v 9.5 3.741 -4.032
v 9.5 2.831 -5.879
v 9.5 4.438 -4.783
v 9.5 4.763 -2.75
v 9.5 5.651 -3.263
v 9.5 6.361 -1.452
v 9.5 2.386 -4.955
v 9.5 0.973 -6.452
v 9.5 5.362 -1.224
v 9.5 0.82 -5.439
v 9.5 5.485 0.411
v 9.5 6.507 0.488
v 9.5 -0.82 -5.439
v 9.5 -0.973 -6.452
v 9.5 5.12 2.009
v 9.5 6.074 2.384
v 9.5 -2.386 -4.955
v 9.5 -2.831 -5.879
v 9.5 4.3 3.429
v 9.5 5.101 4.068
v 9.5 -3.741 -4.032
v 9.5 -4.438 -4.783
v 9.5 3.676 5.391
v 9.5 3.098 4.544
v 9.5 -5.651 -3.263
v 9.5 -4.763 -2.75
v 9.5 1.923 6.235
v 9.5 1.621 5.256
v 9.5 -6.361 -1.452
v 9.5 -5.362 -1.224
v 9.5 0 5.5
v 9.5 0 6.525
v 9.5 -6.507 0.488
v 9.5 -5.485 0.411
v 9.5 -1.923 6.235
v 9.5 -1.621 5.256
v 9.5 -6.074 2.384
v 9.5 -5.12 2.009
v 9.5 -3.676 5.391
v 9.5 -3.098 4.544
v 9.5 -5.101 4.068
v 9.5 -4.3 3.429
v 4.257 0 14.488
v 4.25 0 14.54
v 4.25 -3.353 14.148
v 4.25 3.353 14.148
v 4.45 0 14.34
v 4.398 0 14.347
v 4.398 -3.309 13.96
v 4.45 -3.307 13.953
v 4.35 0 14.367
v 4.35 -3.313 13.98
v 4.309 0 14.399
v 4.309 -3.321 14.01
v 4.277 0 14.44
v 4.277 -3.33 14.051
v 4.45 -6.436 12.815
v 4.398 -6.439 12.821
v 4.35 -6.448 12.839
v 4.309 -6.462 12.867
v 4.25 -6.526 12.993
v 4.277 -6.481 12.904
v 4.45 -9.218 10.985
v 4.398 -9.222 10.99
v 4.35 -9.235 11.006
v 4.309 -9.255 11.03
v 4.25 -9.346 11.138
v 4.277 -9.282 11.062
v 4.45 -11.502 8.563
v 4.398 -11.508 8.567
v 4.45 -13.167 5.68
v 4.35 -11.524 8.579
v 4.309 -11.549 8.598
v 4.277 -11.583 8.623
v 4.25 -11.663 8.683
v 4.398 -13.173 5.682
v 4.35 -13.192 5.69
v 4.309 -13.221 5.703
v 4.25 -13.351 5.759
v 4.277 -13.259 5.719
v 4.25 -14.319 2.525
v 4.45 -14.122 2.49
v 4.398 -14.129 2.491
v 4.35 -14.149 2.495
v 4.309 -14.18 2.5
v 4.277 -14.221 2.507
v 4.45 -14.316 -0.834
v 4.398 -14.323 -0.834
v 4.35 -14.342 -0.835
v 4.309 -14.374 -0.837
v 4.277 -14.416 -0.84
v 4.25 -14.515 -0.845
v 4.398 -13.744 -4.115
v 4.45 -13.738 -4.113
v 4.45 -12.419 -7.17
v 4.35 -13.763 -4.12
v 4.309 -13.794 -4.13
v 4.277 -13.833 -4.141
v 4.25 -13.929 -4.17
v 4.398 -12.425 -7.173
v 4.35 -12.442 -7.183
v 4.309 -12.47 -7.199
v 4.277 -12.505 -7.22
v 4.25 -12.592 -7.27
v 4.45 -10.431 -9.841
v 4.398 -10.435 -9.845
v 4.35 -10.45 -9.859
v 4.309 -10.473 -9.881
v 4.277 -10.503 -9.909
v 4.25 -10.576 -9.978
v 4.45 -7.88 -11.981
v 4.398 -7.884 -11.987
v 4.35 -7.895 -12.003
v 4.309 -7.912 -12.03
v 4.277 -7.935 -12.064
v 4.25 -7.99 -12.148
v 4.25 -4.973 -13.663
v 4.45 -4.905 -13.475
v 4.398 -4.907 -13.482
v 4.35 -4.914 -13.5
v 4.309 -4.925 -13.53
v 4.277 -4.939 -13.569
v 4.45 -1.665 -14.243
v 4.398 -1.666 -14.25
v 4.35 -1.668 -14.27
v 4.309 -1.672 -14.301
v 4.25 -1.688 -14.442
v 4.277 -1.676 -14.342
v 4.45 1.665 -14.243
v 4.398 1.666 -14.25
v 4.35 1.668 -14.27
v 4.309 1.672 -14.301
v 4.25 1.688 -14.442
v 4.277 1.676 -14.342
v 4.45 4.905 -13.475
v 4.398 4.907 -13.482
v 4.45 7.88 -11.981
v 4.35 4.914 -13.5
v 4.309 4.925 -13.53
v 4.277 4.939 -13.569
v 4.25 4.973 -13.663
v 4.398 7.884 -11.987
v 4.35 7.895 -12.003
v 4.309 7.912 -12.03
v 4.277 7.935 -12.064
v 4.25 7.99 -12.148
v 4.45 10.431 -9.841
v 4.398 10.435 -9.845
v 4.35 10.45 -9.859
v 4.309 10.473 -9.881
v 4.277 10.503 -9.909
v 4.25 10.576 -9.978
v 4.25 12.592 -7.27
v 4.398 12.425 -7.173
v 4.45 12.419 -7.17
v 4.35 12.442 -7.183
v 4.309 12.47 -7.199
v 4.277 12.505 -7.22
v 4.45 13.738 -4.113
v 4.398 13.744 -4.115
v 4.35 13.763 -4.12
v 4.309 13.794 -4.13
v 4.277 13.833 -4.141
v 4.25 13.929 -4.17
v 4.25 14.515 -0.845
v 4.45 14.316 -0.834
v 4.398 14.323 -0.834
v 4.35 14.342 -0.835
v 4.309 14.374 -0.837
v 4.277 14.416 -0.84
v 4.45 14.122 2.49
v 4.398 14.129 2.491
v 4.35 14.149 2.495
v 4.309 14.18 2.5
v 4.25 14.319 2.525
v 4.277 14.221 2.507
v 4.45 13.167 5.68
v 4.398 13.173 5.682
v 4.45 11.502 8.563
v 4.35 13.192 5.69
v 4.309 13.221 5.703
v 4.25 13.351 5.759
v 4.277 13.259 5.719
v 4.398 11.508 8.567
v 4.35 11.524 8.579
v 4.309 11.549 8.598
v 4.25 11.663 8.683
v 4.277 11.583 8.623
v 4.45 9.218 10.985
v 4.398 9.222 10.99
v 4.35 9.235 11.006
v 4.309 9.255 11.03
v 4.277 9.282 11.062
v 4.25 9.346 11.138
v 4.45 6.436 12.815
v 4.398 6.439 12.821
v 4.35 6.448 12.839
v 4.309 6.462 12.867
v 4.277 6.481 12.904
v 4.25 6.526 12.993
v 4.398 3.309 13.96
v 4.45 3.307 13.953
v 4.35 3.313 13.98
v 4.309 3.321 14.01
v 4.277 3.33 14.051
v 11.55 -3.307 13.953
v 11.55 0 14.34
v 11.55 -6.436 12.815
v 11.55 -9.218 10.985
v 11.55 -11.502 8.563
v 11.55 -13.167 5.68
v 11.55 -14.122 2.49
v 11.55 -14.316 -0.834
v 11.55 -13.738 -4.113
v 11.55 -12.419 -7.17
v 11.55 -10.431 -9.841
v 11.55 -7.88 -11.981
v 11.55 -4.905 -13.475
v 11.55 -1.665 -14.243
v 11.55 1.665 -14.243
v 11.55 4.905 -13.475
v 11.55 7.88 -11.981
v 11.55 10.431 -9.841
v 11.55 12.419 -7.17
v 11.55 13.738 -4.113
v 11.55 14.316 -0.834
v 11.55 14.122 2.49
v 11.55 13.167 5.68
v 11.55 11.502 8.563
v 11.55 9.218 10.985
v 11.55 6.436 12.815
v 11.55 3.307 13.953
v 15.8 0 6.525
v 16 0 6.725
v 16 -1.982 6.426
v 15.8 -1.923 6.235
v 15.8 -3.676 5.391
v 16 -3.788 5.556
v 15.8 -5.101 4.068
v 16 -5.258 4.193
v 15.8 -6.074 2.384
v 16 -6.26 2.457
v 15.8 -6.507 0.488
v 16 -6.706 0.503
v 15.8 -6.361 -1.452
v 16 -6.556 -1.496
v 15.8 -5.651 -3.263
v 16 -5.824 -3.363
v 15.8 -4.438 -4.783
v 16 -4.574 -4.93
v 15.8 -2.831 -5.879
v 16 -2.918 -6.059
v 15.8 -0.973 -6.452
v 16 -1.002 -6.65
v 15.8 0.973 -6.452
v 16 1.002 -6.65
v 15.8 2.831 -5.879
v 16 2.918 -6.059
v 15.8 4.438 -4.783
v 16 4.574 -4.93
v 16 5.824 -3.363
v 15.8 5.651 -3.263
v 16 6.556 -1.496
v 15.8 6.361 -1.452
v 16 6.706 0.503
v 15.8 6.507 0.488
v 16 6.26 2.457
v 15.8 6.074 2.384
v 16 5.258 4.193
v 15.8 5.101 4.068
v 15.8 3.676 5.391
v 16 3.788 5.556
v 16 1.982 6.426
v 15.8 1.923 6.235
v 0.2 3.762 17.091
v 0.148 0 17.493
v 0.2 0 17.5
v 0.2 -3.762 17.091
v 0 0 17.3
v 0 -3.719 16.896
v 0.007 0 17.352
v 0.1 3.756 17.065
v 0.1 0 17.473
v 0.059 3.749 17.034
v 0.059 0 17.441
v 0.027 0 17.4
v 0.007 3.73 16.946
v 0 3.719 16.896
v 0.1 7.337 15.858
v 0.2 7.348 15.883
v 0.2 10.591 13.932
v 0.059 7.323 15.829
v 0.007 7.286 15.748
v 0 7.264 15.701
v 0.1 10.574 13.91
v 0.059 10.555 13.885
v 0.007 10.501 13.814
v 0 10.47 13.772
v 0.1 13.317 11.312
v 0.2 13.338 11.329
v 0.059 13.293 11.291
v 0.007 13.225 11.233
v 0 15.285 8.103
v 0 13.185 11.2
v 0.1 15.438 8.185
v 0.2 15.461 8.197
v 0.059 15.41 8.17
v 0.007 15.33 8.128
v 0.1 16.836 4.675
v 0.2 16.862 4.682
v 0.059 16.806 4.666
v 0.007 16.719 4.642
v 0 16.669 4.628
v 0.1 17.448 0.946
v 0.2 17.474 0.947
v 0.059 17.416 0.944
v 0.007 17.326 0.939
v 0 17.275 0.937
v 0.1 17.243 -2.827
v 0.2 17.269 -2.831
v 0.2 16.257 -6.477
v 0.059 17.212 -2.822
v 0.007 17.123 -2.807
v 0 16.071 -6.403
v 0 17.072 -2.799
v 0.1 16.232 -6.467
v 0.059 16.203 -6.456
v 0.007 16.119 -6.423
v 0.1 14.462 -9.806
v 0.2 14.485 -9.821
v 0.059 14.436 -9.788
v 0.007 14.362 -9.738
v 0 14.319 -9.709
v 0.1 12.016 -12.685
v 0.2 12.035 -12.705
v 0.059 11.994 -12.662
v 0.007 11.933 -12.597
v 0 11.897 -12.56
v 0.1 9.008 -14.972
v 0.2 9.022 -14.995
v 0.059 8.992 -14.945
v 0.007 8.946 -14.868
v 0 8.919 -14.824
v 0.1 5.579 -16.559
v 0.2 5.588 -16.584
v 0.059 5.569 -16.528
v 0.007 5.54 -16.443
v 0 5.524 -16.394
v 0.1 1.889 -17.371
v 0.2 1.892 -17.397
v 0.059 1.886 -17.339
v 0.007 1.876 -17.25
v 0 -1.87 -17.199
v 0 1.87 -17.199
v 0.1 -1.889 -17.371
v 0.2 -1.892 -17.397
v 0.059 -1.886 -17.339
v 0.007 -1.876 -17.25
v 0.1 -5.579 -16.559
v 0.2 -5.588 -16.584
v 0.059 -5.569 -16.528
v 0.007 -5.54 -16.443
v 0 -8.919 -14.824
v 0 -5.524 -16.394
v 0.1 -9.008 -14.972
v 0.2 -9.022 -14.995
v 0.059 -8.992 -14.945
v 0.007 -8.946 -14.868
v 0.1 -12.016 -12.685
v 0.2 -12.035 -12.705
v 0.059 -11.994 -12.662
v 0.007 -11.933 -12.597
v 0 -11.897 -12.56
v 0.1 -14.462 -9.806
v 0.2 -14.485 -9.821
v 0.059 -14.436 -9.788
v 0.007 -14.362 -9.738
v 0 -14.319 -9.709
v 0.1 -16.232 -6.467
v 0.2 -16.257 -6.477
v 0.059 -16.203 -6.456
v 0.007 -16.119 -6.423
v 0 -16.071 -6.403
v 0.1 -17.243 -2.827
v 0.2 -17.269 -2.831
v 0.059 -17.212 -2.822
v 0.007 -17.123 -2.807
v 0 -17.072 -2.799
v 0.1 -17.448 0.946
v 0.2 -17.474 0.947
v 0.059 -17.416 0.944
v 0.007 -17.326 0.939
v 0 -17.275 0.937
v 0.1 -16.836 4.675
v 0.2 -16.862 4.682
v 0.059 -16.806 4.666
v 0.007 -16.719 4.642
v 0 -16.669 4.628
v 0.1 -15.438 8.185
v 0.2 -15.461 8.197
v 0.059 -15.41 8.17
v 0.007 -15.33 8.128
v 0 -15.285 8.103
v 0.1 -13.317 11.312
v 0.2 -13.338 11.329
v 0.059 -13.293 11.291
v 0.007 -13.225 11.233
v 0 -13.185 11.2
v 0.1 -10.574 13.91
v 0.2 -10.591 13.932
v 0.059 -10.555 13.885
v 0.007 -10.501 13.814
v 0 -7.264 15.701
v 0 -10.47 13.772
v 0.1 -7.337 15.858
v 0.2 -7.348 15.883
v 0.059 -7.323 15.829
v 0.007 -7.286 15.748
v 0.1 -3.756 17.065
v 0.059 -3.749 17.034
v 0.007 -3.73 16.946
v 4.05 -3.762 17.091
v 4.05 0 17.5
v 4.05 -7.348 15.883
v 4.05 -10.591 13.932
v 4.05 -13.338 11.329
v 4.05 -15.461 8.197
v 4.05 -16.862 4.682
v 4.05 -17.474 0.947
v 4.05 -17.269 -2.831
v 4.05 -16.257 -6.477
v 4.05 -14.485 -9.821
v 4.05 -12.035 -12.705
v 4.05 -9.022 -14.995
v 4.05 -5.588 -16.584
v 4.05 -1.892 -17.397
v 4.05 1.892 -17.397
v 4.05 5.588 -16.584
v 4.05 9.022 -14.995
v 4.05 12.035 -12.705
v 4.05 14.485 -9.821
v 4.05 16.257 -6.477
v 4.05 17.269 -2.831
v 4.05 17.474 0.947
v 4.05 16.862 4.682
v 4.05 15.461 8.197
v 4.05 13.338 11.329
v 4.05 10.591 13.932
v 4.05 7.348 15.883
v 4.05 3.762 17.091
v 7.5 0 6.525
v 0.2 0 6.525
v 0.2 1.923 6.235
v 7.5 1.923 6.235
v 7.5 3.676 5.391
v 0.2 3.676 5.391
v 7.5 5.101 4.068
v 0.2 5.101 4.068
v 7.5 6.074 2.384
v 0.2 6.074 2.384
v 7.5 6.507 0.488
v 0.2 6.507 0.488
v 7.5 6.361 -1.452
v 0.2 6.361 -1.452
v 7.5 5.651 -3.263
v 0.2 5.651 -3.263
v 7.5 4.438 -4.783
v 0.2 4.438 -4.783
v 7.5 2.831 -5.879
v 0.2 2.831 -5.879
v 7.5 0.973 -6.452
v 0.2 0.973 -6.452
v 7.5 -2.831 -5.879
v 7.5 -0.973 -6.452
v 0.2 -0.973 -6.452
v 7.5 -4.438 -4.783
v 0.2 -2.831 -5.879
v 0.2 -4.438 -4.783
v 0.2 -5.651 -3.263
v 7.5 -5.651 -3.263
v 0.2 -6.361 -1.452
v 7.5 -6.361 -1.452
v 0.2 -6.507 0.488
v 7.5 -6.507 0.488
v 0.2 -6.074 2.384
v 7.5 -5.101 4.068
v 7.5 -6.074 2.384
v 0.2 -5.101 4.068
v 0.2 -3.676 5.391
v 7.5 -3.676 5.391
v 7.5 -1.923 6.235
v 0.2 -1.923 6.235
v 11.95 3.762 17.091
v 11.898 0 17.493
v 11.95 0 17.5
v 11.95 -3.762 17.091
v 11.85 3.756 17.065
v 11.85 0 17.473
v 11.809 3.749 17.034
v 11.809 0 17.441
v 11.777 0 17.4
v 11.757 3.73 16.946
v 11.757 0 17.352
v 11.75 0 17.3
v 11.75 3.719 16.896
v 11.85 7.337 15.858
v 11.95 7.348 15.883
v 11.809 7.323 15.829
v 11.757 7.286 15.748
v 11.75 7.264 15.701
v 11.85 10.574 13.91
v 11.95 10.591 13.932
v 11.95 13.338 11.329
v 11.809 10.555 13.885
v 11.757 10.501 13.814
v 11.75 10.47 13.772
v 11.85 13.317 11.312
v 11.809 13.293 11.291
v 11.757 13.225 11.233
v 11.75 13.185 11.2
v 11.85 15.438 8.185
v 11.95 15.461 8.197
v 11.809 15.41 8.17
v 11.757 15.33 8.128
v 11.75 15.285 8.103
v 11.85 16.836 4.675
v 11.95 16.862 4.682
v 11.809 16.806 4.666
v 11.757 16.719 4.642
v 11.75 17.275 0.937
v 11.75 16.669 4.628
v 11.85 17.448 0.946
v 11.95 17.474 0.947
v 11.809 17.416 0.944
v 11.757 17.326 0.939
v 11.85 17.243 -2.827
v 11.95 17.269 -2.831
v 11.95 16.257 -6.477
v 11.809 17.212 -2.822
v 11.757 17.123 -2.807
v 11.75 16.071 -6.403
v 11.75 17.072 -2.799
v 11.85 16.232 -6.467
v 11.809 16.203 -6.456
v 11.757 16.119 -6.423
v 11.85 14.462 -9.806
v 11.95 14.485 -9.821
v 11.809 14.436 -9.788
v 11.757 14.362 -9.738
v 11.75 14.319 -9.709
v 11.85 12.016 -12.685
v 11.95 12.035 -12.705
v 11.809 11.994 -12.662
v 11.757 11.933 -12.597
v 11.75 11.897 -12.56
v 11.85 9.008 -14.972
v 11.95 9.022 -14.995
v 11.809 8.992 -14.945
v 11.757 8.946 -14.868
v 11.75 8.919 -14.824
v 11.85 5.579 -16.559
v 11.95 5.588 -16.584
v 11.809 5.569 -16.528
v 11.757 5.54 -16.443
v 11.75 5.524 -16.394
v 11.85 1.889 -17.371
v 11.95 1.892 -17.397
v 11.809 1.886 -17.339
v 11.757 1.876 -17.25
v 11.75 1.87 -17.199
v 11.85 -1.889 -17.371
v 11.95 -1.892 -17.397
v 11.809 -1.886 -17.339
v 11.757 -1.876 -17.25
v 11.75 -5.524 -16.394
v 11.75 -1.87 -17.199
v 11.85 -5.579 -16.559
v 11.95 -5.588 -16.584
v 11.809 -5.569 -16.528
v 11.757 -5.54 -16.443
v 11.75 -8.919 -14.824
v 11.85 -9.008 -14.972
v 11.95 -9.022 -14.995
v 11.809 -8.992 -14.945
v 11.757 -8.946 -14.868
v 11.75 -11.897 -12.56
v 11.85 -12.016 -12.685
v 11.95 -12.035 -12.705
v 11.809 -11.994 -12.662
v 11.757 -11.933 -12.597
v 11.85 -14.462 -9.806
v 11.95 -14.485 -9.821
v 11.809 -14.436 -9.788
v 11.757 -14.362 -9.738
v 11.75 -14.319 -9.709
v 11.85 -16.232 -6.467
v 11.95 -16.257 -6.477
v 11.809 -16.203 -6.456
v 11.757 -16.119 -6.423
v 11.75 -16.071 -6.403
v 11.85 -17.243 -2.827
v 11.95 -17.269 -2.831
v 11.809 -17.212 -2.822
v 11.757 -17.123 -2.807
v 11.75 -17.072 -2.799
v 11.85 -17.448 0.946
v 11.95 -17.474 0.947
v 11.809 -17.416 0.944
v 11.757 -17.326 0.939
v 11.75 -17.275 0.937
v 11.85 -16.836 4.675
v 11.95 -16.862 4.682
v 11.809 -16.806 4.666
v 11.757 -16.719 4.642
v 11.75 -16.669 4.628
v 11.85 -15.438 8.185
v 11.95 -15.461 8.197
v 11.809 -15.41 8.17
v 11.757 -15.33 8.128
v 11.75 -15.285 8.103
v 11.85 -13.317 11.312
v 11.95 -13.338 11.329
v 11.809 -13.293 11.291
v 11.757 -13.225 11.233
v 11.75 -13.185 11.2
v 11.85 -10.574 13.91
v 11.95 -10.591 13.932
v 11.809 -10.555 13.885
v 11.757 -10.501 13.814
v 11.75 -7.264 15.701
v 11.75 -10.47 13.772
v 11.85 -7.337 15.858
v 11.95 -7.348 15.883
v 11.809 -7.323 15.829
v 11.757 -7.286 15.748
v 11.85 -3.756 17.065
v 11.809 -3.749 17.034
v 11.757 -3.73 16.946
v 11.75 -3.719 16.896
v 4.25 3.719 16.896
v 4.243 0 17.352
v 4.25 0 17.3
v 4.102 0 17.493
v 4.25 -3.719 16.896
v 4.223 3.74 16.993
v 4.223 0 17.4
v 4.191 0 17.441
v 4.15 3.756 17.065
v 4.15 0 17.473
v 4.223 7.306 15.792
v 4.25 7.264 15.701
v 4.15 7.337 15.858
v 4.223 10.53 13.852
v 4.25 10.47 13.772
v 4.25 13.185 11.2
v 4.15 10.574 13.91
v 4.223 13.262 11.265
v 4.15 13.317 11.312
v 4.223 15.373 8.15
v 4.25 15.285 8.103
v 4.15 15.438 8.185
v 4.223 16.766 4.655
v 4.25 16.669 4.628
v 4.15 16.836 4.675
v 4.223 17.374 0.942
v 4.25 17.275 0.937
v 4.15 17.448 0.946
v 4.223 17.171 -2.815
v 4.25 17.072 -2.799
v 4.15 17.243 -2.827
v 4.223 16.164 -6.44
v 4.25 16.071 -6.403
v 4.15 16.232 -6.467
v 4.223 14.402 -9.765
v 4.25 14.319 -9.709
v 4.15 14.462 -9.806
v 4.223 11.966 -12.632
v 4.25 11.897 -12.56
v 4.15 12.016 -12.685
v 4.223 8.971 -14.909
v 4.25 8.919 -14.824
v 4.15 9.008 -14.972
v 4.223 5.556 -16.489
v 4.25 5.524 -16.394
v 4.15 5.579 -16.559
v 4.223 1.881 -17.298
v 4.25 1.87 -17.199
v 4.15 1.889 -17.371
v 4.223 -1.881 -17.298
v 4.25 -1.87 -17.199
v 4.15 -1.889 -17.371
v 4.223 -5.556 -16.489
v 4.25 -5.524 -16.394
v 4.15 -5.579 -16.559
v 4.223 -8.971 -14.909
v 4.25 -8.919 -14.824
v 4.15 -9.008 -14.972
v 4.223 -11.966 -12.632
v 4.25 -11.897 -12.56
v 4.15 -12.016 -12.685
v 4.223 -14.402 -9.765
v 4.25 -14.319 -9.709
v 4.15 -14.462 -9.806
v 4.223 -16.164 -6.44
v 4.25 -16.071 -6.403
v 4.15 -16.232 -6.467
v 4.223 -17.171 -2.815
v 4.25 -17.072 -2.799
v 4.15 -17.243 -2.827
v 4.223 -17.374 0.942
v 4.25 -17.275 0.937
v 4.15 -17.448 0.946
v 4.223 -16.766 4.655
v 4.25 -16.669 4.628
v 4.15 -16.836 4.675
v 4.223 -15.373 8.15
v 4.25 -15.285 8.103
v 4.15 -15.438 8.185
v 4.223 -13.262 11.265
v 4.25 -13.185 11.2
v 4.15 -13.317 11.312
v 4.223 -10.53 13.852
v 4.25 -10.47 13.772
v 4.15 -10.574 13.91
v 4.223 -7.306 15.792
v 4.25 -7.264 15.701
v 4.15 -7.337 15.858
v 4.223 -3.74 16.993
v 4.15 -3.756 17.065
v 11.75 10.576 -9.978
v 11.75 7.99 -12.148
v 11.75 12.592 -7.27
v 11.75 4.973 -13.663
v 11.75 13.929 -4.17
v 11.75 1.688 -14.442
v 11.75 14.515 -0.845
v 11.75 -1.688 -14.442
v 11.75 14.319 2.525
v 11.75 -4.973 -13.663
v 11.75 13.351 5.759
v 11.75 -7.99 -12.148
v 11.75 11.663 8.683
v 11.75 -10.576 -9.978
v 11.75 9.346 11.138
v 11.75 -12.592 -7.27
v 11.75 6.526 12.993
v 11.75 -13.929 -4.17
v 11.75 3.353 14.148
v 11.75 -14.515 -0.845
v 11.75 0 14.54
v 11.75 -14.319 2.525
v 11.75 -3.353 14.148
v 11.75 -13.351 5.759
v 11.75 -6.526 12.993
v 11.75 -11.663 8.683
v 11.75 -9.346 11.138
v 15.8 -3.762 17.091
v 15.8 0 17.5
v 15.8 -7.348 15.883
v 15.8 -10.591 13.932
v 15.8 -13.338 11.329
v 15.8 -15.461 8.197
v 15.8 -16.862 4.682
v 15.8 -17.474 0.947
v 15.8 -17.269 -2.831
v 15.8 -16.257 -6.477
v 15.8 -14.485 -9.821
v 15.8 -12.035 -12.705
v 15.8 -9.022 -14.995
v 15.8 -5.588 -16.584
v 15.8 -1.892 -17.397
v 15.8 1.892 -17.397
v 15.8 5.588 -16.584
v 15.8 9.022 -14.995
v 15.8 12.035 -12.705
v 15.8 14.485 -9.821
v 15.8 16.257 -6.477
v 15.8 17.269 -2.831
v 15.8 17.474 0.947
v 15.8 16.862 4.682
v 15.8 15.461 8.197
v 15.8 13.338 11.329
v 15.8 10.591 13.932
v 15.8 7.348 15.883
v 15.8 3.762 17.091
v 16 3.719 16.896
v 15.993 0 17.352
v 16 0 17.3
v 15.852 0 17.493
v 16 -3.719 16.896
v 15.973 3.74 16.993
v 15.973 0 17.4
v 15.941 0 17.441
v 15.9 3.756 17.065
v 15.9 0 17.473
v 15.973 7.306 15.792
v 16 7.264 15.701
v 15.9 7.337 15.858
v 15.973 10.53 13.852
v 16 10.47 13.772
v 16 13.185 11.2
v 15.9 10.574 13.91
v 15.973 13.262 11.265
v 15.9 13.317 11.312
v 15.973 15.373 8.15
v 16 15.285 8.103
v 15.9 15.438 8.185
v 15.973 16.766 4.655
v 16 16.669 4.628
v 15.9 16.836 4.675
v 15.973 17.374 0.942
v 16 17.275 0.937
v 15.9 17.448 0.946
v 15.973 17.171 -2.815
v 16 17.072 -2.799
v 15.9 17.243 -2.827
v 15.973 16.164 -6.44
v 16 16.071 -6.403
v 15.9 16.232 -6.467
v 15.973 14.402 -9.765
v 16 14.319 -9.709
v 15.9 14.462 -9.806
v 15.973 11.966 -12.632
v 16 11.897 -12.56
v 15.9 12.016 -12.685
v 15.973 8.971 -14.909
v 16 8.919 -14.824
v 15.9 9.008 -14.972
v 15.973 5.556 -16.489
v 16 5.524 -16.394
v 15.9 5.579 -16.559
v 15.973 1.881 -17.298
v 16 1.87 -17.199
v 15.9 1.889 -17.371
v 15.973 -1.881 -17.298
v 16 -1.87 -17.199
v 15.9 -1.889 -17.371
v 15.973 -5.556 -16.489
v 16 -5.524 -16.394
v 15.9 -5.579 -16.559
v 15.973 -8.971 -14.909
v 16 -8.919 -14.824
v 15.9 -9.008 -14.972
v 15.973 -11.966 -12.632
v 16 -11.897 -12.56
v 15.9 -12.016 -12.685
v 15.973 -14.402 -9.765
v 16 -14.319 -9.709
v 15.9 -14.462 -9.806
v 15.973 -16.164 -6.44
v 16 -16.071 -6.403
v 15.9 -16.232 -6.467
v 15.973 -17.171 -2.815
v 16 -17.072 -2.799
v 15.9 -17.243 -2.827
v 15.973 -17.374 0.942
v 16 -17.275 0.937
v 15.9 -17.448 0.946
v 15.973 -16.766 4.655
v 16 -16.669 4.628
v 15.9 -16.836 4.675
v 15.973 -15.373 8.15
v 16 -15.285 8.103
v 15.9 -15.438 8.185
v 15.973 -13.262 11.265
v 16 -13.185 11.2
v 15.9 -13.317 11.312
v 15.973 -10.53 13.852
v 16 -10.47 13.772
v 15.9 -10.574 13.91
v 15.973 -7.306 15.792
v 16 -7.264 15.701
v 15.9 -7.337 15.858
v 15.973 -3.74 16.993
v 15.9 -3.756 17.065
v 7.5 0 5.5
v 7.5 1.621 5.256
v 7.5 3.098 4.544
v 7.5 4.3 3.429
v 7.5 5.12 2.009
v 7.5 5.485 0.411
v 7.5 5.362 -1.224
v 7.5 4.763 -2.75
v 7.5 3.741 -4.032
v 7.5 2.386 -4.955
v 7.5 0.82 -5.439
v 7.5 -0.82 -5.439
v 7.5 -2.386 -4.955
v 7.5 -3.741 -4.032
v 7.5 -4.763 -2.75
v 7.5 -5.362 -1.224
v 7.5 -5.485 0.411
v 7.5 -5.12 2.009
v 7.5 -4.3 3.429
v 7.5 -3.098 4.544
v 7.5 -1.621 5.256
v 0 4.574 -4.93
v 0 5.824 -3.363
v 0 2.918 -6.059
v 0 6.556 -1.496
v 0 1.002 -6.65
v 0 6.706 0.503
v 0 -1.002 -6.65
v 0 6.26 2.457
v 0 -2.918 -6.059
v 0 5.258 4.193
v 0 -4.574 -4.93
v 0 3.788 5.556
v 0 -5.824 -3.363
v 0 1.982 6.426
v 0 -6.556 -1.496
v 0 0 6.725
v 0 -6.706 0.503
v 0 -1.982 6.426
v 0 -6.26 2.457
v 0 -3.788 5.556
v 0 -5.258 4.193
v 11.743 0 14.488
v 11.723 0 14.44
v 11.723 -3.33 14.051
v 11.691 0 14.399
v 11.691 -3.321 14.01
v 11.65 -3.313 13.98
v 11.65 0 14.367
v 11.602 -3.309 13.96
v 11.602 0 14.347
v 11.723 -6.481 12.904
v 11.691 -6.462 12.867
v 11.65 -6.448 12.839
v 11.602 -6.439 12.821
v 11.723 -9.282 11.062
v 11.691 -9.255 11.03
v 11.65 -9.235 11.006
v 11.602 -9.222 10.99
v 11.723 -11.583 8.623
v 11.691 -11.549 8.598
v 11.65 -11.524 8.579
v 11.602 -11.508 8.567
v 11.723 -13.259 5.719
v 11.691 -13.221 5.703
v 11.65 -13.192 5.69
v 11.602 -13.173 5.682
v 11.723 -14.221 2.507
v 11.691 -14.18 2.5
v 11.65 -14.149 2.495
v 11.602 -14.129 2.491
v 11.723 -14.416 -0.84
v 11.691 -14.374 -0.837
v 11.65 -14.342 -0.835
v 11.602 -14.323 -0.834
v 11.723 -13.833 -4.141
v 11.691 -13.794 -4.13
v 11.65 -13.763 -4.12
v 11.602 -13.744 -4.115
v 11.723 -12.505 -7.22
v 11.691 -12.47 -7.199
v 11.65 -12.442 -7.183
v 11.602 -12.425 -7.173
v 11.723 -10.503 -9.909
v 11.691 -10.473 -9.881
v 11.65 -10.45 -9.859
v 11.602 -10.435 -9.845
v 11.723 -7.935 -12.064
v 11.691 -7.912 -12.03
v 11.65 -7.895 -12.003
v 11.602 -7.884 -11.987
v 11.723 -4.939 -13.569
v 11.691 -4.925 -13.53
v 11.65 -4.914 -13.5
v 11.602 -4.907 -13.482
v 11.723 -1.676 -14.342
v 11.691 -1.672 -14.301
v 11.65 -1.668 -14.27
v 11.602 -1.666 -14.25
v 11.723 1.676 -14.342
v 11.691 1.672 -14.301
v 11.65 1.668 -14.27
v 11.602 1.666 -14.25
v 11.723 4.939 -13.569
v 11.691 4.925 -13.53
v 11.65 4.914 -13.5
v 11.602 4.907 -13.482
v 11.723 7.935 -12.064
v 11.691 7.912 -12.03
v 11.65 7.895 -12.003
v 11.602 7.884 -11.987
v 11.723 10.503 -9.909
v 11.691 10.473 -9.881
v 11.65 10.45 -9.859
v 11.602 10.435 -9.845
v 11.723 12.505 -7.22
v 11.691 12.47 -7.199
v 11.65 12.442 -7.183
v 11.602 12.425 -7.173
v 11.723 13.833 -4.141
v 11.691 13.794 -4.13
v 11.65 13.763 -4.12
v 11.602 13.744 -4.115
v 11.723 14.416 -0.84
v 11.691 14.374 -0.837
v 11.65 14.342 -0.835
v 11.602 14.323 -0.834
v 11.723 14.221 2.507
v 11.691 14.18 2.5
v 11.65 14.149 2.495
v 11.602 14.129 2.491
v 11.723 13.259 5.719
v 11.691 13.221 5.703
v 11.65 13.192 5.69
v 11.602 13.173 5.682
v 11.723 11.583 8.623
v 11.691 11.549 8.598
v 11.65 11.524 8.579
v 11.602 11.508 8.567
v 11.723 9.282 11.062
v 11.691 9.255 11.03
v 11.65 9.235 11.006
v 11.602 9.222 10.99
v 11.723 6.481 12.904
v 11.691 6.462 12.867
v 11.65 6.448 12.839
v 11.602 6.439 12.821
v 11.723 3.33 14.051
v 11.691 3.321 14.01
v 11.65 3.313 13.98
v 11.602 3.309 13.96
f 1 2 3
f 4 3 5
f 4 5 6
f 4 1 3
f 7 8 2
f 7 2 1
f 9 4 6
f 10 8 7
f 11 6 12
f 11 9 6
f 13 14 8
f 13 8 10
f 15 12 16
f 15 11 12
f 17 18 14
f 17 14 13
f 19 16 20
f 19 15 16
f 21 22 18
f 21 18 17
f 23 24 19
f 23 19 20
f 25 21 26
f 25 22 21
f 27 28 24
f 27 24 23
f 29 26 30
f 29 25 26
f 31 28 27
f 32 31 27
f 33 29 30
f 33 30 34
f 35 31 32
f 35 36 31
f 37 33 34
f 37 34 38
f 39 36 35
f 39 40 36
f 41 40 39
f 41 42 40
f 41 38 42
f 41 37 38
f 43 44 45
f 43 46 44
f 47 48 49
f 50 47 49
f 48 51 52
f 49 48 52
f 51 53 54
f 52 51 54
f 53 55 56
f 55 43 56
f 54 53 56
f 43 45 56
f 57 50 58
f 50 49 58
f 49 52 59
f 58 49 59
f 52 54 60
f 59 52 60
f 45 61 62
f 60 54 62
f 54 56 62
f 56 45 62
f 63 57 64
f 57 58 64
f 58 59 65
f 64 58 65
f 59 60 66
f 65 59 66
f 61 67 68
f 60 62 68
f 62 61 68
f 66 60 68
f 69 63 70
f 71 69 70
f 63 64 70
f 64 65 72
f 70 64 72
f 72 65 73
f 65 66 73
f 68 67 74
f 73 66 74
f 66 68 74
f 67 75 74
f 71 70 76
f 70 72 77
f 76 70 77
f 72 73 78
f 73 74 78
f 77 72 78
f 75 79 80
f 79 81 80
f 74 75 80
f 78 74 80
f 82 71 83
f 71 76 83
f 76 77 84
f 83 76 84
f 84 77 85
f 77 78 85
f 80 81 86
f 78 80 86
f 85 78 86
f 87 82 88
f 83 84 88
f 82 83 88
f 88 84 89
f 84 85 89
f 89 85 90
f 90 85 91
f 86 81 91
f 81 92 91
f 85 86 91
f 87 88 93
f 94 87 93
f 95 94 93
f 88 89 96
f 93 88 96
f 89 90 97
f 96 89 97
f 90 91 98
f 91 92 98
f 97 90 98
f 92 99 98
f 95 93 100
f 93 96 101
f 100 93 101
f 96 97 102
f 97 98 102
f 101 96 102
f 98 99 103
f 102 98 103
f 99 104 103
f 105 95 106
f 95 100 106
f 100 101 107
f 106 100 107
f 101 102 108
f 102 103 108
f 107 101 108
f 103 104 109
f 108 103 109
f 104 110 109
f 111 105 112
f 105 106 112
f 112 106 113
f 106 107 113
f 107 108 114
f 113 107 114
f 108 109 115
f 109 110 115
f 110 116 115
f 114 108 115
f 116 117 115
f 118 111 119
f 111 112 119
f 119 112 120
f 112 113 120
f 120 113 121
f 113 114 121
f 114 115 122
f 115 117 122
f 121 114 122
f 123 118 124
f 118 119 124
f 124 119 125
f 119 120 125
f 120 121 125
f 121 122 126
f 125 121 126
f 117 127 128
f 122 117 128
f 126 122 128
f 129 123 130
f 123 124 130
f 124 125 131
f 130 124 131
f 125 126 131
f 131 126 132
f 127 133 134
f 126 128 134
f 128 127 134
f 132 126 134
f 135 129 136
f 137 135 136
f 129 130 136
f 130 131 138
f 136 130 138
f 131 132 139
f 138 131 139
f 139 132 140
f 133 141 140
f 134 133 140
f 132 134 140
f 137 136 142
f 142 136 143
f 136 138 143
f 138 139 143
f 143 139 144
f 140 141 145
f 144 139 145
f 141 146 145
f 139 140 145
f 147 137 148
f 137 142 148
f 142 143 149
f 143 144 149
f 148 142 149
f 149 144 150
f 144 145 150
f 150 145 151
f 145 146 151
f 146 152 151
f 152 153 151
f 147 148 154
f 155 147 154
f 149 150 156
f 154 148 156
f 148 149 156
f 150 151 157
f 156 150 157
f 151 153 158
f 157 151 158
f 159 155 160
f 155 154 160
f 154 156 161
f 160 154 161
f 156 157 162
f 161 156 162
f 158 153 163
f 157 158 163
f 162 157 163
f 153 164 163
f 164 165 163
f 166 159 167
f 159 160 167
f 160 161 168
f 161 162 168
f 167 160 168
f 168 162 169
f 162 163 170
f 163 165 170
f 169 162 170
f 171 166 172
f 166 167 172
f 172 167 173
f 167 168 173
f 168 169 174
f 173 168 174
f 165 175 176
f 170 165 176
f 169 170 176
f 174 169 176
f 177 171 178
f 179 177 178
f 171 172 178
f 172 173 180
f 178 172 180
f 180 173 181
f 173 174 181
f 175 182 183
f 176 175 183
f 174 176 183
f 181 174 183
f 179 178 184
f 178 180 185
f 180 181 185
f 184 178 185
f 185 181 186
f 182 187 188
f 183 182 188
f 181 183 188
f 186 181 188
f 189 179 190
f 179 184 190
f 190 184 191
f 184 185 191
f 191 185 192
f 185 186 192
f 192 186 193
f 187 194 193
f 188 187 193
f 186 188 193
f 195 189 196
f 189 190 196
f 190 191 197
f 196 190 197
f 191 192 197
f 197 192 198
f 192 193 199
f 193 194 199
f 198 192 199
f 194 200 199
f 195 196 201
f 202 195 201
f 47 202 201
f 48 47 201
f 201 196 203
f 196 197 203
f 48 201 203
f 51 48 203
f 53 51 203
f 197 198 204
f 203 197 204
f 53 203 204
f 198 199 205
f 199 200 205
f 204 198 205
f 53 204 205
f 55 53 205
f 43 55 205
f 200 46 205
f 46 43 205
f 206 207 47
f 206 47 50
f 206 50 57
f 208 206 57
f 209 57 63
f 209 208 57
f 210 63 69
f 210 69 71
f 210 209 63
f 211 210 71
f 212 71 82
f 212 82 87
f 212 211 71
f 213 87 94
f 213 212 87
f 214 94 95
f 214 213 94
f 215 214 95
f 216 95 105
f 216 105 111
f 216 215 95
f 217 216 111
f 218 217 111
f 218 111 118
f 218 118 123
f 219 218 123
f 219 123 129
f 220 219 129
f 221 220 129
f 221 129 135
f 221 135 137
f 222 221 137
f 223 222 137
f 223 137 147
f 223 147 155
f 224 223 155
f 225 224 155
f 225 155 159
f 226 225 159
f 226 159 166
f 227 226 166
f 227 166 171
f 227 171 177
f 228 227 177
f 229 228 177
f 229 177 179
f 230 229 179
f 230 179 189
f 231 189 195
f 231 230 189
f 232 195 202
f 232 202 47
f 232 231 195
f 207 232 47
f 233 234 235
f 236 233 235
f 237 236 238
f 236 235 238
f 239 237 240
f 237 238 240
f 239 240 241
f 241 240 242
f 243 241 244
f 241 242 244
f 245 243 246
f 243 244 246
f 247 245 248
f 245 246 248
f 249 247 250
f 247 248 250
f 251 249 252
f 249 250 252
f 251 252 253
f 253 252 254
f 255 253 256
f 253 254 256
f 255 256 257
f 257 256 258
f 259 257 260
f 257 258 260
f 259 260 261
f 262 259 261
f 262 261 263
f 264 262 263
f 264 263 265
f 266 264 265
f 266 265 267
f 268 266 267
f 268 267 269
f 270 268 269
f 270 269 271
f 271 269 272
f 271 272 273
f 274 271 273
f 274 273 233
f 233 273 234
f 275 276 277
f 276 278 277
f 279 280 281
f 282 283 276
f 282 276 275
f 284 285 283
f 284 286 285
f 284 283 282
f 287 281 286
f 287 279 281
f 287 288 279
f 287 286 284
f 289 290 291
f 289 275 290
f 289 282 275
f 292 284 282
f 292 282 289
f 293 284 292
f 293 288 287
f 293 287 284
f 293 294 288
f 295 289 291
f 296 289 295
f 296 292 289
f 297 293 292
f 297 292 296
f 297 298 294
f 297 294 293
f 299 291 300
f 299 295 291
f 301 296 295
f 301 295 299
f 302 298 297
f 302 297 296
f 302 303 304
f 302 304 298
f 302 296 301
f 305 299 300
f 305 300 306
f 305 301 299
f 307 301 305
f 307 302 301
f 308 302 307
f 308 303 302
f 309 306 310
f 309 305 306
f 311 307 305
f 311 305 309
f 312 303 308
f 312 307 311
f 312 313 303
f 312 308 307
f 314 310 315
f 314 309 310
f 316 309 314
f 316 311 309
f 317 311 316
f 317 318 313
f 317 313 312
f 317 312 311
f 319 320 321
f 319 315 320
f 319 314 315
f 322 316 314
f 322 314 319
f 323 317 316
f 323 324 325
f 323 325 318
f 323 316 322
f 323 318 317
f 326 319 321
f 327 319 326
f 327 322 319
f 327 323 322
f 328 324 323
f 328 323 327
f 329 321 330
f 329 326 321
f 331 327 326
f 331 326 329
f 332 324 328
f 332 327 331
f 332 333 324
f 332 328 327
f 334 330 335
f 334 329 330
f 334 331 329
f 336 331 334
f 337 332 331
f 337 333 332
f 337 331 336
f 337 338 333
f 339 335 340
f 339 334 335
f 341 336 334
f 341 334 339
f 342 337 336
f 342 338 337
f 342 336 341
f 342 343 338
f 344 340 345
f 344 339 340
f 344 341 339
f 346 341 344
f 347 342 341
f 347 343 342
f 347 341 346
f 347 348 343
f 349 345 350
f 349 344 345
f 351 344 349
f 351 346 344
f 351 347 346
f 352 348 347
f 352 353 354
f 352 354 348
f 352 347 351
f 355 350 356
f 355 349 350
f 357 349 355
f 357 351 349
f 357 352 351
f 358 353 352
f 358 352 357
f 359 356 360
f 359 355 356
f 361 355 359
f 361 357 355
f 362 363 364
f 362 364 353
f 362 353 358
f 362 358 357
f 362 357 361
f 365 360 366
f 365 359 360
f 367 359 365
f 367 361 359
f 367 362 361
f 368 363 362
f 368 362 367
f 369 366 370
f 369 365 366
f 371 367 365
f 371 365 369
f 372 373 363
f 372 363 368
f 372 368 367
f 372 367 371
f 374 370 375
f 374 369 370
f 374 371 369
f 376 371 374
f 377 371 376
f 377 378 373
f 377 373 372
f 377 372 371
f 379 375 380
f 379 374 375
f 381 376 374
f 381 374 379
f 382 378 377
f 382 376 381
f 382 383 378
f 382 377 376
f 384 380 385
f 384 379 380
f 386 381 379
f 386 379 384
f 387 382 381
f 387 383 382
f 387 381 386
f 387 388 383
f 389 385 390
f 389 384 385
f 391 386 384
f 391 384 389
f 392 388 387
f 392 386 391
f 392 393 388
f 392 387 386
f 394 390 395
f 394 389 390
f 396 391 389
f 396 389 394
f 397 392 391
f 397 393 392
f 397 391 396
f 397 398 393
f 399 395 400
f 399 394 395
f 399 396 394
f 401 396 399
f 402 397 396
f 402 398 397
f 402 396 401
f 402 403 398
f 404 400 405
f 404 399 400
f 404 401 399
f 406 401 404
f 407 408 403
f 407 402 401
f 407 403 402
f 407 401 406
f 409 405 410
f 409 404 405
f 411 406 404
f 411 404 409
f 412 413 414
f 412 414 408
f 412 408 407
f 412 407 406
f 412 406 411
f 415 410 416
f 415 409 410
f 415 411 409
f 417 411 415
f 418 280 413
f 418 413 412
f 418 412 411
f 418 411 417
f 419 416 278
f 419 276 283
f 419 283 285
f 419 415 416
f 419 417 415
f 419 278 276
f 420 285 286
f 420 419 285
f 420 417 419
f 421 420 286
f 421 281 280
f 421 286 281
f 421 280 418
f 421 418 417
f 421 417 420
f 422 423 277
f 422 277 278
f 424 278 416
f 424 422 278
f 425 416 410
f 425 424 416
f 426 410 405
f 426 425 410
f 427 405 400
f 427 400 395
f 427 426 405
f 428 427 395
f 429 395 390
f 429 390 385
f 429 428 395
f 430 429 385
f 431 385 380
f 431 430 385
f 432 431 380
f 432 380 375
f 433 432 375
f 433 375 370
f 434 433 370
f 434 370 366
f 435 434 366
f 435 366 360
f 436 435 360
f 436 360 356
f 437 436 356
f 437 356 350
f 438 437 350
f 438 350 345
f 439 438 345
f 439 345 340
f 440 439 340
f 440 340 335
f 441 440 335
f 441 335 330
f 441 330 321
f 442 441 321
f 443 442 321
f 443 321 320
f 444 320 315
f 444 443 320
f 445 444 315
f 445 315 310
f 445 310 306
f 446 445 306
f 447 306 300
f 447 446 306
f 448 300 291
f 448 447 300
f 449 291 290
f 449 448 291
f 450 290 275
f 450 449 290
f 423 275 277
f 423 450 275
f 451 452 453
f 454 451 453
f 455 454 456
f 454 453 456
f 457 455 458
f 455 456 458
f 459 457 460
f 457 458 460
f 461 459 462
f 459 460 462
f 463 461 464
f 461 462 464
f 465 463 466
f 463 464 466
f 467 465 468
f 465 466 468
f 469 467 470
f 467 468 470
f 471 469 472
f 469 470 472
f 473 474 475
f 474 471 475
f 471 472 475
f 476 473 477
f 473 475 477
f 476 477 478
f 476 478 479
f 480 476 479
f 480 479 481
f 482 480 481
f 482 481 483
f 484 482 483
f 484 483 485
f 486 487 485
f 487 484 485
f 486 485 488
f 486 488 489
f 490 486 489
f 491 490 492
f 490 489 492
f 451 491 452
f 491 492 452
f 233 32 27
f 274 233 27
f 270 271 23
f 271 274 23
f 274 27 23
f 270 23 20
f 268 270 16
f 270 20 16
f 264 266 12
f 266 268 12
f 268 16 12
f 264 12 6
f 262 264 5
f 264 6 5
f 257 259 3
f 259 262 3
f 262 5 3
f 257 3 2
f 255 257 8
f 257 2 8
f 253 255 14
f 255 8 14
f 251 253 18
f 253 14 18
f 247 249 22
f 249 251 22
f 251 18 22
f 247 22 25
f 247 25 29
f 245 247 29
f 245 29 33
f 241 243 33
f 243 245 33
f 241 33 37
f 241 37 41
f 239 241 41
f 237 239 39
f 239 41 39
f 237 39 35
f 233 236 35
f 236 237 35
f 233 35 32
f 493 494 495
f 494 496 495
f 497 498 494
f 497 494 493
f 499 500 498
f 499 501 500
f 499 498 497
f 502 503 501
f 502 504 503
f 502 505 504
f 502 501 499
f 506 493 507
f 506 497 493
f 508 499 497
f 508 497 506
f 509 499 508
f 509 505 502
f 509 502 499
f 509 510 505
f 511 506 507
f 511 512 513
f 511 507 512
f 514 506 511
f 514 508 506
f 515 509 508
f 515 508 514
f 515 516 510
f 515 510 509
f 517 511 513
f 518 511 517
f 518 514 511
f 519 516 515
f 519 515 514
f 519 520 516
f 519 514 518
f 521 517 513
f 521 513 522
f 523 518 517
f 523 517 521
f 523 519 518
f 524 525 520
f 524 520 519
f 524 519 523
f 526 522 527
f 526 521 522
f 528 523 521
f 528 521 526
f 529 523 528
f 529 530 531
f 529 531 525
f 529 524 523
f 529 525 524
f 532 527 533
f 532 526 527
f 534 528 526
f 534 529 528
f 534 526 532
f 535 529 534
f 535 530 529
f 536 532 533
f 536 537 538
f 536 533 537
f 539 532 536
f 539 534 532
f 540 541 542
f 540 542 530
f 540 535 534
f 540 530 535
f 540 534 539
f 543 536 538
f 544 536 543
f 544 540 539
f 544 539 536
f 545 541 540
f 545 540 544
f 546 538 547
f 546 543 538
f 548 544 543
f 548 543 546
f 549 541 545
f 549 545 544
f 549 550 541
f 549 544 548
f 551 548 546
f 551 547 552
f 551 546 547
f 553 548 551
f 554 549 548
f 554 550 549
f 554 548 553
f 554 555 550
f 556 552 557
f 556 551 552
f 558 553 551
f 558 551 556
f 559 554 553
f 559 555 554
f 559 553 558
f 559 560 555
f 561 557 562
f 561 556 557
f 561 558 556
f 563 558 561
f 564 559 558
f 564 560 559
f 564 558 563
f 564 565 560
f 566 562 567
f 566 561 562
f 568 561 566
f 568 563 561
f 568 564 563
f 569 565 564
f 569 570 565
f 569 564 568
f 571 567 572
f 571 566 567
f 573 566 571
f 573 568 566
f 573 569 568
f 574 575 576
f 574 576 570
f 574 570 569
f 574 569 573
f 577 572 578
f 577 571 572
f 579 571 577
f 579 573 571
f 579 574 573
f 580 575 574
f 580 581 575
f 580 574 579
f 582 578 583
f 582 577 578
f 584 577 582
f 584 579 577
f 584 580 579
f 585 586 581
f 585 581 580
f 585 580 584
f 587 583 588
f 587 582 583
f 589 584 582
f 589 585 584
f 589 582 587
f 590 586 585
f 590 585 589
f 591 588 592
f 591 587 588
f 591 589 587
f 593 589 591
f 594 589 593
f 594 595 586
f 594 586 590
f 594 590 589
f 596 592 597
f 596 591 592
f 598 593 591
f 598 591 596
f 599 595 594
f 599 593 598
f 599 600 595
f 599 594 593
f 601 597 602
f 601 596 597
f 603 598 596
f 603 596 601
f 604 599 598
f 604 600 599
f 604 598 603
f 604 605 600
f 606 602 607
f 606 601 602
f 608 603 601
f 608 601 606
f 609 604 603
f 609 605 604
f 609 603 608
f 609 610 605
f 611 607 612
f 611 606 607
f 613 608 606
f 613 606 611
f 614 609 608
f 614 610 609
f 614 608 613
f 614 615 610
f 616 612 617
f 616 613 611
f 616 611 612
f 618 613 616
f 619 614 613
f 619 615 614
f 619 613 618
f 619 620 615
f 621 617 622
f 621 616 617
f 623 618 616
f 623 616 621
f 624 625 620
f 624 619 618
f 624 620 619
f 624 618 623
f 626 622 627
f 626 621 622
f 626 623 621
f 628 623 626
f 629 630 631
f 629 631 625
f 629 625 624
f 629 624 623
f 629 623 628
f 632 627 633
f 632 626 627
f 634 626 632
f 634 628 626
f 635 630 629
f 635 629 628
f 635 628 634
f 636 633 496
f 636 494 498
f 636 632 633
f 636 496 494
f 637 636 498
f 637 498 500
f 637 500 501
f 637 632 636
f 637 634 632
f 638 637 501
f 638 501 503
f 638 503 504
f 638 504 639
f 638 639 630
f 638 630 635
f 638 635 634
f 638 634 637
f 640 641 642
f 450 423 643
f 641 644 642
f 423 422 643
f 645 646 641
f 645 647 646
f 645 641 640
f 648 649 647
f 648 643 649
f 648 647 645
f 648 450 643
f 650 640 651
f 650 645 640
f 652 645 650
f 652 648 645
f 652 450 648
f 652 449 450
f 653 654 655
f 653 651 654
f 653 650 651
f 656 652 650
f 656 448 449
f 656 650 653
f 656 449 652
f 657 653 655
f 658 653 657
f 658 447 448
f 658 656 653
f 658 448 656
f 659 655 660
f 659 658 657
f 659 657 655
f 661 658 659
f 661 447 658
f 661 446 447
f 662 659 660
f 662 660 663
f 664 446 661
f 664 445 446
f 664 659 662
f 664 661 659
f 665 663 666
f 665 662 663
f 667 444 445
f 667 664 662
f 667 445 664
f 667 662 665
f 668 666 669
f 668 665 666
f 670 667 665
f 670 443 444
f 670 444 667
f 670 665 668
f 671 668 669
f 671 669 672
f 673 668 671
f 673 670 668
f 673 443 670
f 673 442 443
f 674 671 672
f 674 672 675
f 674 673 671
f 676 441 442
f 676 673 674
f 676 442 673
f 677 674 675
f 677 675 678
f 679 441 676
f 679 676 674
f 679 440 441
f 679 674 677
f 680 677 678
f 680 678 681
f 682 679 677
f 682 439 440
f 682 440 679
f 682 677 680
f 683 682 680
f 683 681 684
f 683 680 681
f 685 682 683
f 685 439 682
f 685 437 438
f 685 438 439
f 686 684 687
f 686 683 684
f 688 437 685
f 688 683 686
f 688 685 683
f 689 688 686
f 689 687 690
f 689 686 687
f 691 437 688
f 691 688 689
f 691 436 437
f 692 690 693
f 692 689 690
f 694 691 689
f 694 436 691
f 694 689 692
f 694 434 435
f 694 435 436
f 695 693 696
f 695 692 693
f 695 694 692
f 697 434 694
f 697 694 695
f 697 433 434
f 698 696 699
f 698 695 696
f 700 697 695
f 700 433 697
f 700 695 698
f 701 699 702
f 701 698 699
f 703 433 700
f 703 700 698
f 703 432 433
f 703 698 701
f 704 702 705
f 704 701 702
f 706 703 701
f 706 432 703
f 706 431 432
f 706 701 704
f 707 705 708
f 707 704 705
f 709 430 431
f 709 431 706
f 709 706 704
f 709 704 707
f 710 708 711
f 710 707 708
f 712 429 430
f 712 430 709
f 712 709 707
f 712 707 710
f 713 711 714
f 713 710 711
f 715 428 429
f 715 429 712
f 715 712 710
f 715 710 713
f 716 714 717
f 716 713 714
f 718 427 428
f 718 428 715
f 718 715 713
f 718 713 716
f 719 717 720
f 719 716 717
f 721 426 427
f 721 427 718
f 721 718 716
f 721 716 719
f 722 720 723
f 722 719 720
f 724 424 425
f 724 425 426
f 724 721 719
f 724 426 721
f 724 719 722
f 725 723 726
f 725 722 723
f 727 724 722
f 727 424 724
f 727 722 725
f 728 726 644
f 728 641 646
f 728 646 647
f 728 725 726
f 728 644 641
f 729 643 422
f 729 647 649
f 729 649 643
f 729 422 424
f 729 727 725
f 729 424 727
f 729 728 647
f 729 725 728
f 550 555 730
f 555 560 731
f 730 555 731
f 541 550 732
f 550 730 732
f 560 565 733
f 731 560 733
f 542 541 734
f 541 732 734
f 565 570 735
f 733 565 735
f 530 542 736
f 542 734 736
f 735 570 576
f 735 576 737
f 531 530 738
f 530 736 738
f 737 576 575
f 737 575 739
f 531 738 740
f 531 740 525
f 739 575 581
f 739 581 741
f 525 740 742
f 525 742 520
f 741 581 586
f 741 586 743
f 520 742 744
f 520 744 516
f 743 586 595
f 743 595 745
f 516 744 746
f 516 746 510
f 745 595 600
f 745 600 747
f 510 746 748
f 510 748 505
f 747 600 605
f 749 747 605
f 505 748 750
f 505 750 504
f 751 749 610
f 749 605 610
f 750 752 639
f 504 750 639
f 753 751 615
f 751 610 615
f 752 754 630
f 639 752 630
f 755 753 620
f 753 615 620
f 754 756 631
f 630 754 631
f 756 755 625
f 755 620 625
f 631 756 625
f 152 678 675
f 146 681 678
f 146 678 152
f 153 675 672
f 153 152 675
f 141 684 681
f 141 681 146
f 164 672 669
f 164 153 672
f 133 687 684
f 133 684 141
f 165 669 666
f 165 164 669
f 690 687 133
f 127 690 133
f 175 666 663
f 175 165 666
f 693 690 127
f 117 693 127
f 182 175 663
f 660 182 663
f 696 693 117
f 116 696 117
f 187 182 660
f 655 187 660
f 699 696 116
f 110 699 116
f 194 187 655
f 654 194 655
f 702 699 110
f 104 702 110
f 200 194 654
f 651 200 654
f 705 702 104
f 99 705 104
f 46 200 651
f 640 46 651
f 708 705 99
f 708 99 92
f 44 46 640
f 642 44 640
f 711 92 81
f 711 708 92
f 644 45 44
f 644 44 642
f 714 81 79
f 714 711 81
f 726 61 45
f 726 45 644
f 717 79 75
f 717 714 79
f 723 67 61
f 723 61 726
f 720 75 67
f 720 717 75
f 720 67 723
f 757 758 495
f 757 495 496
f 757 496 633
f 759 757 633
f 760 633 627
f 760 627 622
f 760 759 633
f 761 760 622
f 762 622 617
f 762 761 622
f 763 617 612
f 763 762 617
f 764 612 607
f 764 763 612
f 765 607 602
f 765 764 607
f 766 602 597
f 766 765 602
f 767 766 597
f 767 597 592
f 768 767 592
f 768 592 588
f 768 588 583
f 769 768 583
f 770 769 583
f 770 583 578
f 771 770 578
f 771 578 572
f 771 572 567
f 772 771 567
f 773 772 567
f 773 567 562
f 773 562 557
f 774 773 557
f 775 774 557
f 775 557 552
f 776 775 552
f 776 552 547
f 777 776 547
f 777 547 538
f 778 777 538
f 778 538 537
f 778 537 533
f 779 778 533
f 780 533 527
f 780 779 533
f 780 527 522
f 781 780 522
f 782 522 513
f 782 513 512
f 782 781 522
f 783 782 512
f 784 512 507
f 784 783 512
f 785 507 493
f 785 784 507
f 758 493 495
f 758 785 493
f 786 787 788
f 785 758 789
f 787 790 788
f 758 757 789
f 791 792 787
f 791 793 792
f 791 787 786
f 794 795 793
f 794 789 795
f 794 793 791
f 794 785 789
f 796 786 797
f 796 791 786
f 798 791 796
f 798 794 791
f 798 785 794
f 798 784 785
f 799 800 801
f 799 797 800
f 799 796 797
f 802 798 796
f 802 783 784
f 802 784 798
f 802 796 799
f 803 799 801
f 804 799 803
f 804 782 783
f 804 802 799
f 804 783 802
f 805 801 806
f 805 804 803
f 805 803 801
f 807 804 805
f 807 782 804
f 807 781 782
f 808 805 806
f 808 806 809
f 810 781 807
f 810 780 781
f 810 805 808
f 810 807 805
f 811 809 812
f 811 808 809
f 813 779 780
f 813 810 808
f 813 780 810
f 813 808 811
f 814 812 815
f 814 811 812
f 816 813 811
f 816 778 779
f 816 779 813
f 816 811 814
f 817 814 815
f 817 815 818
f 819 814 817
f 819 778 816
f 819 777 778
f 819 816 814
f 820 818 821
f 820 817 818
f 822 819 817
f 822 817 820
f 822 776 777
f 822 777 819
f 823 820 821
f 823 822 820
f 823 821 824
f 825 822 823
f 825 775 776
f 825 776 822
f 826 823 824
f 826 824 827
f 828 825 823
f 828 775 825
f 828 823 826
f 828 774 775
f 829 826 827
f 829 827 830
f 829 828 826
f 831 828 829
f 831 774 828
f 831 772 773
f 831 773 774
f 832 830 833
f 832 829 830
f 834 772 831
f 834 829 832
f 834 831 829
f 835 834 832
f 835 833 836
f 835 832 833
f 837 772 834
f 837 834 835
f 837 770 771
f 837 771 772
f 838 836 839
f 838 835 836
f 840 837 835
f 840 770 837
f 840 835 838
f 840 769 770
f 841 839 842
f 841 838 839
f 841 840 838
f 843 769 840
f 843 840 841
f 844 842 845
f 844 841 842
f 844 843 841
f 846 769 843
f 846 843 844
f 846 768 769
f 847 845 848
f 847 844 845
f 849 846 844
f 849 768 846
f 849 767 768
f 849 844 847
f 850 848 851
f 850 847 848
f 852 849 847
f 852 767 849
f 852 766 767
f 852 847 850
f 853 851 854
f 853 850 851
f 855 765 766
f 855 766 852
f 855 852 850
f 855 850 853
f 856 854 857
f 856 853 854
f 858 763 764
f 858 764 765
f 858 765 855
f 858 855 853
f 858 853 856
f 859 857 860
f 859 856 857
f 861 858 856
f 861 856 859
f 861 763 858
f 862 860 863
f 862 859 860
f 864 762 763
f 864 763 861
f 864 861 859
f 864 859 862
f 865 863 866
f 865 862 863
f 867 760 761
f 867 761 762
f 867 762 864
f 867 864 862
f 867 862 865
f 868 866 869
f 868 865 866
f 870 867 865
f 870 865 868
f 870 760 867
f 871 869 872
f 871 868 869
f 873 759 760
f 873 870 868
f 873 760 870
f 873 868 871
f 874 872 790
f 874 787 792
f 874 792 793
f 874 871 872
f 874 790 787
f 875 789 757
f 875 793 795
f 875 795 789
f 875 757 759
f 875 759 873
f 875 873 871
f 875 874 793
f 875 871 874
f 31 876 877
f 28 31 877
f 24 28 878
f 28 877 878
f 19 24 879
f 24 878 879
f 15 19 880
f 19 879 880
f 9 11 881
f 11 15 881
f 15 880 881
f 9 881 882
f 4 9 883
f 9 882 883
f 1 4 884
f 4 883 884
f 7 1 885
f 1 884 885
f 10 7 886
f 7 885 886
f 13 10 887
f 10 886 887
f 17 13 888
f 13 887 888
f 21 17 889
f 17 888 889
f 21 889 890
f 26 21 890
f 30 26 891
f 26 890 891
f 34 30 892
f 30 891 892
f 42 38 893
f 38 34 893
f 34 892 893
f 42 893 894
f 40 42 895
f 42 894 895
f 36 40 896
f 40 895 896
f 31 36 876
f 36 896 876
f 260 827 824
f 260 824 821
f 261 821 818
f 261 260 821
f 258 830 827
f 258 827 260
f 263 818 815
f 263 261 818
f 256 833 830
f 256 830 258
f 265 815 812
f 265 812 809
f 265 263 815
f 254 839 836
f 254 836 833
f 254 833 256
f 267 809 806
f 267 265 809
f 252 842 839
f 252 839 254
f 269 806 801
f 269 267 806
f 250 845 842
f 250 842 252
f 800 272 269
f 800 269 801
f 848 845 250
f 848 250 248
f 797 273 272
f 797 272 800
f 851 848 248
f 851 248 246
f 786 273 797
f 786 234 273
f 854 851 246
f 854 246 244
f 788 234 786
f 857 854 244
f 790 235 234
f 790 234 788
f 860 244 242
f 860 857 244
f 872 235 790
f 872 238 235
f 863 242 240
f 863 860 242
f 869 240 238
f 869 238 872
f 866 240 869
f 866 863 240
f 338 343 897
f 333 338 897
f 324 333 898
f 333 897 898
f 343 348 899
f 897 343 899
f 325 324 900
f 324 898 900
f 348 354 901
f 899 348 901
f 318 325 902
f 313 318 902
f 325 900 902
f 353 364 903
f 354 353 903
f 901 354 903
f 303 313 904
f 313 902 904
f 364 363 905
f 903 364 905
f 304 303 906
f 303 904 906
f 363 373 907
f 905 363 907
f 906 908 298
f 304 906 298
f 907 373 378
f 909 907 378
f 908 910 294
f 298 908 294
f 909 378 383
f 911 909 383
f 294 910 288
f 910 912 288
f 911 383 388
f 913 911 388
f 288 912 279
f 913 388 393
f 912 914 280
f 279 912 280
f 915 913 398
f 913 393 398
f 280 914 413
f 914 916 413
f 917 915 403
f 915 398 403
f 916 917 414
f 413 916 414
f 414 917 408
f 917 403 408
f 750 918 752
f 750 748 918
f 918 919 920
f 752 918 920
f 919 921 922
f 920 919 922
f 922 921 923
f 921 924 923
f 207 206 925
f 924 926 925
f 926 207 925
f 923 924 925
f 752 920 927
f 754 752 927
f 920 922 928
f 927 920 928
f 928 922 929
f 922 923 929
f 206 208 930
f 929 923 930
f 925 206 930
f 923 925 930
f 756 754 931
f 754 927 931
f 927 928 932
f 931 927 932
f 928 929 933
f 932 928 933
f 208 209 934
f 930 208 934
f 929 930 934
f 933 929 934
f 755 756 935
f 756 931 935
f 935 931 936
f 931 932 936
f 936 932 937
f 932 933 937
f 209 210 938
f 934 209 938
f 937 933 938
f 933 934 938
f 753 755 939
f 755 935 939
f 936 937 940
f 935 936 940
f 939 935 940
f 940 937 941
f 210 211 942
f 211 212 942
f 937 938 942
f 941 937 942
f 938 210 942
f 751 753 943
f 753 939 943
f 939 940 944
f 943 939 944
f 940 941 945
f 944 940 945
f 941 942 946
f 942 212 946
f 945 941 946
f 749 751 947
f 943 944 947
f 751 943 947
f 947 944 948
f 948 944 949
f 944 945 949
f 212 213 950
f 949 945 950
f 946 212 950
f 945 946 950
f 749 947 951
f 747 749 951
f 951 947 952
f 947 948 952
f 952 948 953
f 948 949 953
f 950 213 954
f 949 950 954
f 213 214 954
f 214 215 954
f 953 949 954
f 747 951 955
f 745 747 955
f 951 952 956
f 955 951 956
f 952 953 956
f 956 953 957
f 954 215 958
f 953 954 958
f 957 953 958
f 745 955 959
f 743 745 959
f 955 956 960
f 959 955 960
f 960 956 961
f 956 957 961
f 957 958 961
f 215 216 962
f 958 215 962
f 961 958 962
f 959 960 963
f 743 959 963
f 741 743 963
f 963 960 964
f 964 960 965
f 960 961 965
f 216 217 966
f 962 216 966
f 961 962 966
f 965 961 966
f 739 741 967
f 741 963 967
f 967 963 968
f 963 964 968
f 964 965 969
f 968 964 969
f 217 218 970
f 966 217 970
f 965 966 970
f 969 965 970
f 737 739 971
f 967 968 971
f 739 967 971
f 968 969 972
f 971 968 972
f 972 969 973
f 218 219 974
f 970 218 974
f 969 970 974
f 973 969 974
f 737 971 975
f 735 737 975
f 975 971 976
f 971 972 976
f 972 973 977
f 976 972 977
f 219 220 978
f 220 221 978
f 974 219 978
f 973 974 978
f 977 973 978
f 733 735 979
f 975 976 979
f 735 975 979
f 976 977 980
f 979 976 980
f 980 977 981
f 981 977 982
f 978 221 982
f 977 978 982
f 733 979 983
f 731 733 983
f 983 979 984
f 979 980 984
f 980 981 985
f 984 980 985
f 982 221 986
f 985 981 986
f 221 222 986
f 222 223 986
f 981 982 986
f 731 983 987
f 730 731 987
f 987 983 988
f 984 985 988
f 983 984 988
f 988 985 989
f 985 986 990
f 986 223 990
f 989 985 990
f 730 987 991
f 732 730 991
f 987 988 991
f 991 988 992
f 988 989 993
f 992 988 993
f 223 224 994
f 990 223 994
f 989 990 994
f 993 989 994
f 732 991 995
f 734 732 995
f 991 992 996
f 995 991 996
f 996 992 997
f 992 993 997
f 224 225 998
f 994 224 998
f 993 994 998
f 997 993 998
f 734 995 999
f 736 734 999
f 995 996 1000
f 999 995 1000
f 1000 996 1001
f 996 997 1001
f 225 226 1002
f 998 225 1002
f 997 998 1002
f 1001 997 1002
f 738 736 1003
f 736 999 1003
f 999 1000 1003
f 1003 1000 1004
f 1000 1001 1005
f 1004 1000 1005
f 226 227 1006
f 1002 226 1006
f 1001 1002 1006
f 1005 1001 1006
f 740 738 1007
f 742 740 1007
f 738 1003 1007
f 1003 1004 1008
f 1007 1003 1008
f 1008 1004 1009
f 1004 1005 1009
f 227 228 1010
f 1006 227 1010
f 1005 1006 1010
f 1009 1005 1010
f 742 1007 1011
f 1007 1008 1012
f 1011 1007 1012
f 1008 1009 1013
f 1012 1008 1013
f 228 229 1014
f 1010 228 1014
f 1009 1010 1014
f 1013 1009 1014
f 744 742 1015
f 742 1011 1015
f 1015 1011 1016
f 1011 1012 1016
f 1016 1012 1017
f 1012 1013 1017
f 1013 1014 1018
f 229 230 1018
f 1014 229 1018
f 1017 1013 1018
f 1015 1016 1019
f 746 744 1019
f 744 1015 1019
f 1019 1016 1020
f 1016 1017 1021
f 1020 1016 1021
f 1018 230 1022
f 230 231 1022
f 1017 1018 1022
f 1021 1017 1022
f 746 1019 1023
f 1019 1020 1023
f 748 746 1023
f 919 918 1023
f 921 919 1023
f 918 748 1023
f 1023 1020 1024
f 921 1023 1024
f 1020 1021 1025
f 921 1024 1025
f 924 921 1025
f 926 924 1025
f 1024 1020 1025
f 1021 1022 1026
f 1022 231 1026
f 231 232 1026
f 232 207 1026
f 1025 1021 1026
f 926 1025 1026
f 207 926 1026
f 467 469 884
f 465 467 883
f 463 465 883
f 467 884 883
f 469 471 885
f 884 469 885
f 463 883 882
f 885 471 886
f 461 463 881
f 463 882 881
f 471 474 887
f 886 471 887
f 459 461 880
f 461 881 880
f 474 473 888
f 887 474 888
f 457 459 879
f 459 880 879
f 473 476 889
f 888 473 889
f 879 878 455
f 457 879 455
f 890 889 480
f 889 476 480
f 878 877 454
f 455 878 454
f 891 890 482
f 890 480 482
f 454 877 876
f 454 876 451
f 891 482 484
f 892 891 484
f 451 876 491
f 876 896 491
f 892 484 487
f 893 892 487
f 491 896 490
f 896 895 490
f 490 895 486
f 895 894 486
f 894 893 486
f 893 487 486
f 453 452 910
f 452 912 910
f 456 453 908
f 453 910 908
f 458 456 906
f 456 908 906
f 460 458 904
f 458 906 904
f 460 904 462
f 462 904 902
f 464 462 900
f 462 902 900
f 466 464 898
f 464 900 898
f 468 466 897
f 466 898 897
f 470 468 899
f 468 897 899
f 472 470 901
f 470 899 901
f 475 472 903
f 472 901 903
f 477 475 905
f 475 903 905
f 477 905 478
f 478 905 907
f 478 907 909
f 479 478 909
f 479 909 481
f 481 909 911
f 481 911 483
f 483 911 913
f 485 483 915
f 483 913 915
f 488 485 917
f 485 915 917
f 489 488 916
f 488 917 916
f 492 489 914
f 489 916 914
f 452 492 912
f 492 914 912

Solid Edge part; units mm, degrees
sketch "Sketch1" plane through (0, 0, 0) normal (0, -1, 0) x (1, 0, 0)
  line L0 (11.75, 17.5) -> (16, 17.5)
  line L1 (16, 17.5) -> (16, 6.525)
  line L2 (16, 6.525) -> (9.5, 6.525)
  line L3 (9.5, 6.525) -> (9.5, 5.5)
  line L4 (9.5, 5.5) -> (7.5, 5.5)
  line L5 (7.5, 5.5) -> (7.5, 6.525)
  line L6 (7.5, 6.525) -> (0, 6.525)
  line L7 (0, 6.525) -> (0, 17.5)
  line L8 (0, 17.5) -> (4.25, 17.5)
  line L9 (4.25, 17.5) -> (4.25, 14.34)
  line L10 (4.25, 14.34) -> (11.75, 14.34)
  line L11 (11.75, 14.34) -> (11.75, 17.5)
revolve "RevolvedProtrusion1" add sketch "Sketch1" angle 360 about axis through (0, 0, 0) along (1, 0, 0)
chamfer "Chamfer1" distance 0.2 angle 45 2 edges at (16, 0, -6.525) (0, 0, -6.525)
fillet "Verrundung_1" radius 0.2 6 edges at (11.75, 0, -14.34) (4.25, 0, -14.34) (4.25, 0, -17.5) (0, 0, -17.5) (11.75, 0, -17.5) (16, 0, -17.5)
